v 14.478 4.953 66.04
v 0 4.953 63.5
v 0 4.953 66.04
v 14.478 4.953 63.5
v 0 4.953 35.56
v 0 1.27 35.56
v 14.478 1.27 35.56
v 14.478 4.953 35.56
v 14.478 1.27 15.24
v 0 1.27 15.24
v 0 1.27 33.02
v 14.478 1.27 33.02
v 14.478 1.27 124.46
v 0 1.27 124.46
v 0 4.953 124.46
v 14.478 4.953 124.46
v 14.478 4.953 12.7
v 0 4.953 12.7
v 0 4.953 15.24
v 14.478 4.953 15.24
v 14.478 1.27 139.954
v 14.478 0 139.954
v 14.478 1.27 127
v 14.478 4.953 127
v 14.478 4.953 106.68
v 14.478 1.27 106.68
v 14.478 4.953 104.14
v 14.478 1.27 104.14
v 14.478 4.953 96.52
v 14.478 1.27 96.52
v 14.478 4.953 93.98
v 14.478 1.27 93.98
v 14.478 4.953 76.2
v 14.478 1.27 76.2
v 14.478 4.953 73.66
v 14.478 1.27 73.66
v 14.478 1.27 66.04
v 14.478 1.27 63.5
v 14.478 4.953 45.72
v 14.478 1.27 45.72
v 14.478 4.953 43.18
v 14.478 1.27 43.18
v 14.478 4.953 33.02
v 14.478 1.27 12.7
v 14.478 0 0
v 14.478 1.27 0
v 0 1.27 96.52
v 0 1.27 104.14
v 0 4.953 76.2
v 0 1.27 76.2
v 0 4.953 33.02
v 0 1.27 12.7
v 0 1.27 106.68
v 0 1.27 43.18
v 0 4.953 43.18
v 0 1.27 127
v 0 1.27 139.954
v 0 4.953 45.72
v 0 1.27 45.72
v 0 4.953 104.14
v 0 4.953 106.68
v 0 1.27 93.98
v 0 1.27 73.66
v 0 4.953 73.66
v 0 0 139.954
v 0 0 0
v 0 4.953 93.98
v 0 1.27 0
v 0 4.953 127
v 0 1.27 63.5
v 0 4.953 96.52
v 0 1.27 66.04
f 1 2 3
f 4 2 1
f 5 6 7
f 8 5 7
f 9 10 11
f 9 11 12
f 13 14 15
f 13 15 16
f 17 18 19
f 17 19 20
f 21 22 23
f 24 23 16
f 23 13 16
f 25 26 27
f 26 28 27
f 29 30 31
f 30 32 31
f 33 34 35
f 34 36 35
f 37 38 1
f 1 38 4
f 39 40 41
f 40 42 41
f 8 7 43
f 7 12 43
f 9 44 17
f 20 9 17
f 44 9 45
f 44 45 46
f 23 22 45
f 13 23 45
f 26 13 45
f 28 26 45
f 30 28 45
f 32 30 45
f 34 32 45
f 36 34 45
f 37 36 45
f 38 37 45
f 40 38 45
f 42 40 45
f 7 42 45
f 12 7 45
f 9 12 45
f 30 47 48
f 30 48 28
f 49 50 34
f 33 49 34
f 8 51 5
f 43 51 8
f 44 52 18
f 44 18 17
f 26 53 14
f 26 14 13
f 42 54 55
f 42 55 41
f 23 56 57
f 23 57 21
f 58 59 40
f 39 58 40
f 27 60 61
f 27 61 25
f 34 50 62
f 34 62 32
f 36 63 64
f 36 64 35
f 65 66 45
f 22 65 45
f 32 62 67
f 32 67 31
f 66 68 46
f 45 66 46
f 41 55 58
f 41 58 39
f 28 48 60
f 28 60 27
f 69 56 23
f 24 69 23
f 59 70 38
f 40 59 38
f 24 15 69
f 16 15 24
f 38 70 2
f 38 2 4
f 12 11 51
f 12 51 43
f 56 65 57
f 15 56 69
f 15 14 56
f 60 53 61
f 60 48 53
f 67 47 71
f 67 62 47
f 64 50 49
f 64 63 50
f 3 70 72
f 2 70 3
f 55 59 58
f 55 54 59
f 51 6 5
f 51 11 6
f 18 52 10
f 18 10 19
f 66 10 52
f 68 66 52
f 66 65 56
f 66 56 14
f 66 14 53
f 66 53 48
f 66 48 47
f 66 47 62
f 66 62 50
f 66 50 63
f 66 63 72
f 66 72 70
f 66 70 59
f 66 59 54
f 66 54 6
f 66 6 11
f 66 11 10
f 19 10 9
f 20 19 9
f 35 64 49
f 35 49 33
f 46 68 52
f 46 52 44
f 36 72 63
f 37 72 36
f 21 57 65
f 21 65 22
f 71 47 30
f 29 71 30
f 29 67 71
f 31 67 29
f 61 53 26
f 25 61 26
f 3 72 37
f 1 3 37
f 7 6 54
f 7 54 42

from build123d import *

# Parameters (mm, degrees)
SKETCH1_W           = 14.478
SKETCH1_H           = 1.27
BOSS_EXTRUDE1_DEPTH = 139.954
SKETCH2_W           = 14.478
SKETCH2_H           = 2.54
BOSS_EXTRUDE2_DEPTH = 3.683
LPATTERN1_COUNT     = 4
LPATTERN1_PITCH     = 30.48


with BuildPart() as part:
    # Sketch1 → Boss-Extrude1 (new body)
    with BuildSketch(Plane.XY):
        with Locations((7.239, 0.635)):
            Rectangle(SKETCH1_W, SKETCH1_H)
    extrude(amount=BOSS_EXTRUDE1_DEPTH)

    # Sketch2 → Boss-Extrude2 (add)
    with BuildSketch(Plane(origin=(0, 1.27, 0), x_dir=(1, 0, 0), z_dir=(0, 1, 0))):
        with Locations((7.239, -13.97)):
            Rectangle(SKETCH2_W, SKETCH2_H)
        with Locations((7.239, -34.29)):
            Rectangle(SKETCH2_W, SKETCH2_H)
    boss_extrude2 = extrude(amount=BOSS_EXTRUDE2_DEPTH)

    # LPattern1: Boss-Extrude2 ×4
    with Locations(*[(0, 0, i * LPATTERN1_PITCH) for i in range(1, LPATTERN1_COUNT)]):
        add(boss_extrude2)


solid = part.part
